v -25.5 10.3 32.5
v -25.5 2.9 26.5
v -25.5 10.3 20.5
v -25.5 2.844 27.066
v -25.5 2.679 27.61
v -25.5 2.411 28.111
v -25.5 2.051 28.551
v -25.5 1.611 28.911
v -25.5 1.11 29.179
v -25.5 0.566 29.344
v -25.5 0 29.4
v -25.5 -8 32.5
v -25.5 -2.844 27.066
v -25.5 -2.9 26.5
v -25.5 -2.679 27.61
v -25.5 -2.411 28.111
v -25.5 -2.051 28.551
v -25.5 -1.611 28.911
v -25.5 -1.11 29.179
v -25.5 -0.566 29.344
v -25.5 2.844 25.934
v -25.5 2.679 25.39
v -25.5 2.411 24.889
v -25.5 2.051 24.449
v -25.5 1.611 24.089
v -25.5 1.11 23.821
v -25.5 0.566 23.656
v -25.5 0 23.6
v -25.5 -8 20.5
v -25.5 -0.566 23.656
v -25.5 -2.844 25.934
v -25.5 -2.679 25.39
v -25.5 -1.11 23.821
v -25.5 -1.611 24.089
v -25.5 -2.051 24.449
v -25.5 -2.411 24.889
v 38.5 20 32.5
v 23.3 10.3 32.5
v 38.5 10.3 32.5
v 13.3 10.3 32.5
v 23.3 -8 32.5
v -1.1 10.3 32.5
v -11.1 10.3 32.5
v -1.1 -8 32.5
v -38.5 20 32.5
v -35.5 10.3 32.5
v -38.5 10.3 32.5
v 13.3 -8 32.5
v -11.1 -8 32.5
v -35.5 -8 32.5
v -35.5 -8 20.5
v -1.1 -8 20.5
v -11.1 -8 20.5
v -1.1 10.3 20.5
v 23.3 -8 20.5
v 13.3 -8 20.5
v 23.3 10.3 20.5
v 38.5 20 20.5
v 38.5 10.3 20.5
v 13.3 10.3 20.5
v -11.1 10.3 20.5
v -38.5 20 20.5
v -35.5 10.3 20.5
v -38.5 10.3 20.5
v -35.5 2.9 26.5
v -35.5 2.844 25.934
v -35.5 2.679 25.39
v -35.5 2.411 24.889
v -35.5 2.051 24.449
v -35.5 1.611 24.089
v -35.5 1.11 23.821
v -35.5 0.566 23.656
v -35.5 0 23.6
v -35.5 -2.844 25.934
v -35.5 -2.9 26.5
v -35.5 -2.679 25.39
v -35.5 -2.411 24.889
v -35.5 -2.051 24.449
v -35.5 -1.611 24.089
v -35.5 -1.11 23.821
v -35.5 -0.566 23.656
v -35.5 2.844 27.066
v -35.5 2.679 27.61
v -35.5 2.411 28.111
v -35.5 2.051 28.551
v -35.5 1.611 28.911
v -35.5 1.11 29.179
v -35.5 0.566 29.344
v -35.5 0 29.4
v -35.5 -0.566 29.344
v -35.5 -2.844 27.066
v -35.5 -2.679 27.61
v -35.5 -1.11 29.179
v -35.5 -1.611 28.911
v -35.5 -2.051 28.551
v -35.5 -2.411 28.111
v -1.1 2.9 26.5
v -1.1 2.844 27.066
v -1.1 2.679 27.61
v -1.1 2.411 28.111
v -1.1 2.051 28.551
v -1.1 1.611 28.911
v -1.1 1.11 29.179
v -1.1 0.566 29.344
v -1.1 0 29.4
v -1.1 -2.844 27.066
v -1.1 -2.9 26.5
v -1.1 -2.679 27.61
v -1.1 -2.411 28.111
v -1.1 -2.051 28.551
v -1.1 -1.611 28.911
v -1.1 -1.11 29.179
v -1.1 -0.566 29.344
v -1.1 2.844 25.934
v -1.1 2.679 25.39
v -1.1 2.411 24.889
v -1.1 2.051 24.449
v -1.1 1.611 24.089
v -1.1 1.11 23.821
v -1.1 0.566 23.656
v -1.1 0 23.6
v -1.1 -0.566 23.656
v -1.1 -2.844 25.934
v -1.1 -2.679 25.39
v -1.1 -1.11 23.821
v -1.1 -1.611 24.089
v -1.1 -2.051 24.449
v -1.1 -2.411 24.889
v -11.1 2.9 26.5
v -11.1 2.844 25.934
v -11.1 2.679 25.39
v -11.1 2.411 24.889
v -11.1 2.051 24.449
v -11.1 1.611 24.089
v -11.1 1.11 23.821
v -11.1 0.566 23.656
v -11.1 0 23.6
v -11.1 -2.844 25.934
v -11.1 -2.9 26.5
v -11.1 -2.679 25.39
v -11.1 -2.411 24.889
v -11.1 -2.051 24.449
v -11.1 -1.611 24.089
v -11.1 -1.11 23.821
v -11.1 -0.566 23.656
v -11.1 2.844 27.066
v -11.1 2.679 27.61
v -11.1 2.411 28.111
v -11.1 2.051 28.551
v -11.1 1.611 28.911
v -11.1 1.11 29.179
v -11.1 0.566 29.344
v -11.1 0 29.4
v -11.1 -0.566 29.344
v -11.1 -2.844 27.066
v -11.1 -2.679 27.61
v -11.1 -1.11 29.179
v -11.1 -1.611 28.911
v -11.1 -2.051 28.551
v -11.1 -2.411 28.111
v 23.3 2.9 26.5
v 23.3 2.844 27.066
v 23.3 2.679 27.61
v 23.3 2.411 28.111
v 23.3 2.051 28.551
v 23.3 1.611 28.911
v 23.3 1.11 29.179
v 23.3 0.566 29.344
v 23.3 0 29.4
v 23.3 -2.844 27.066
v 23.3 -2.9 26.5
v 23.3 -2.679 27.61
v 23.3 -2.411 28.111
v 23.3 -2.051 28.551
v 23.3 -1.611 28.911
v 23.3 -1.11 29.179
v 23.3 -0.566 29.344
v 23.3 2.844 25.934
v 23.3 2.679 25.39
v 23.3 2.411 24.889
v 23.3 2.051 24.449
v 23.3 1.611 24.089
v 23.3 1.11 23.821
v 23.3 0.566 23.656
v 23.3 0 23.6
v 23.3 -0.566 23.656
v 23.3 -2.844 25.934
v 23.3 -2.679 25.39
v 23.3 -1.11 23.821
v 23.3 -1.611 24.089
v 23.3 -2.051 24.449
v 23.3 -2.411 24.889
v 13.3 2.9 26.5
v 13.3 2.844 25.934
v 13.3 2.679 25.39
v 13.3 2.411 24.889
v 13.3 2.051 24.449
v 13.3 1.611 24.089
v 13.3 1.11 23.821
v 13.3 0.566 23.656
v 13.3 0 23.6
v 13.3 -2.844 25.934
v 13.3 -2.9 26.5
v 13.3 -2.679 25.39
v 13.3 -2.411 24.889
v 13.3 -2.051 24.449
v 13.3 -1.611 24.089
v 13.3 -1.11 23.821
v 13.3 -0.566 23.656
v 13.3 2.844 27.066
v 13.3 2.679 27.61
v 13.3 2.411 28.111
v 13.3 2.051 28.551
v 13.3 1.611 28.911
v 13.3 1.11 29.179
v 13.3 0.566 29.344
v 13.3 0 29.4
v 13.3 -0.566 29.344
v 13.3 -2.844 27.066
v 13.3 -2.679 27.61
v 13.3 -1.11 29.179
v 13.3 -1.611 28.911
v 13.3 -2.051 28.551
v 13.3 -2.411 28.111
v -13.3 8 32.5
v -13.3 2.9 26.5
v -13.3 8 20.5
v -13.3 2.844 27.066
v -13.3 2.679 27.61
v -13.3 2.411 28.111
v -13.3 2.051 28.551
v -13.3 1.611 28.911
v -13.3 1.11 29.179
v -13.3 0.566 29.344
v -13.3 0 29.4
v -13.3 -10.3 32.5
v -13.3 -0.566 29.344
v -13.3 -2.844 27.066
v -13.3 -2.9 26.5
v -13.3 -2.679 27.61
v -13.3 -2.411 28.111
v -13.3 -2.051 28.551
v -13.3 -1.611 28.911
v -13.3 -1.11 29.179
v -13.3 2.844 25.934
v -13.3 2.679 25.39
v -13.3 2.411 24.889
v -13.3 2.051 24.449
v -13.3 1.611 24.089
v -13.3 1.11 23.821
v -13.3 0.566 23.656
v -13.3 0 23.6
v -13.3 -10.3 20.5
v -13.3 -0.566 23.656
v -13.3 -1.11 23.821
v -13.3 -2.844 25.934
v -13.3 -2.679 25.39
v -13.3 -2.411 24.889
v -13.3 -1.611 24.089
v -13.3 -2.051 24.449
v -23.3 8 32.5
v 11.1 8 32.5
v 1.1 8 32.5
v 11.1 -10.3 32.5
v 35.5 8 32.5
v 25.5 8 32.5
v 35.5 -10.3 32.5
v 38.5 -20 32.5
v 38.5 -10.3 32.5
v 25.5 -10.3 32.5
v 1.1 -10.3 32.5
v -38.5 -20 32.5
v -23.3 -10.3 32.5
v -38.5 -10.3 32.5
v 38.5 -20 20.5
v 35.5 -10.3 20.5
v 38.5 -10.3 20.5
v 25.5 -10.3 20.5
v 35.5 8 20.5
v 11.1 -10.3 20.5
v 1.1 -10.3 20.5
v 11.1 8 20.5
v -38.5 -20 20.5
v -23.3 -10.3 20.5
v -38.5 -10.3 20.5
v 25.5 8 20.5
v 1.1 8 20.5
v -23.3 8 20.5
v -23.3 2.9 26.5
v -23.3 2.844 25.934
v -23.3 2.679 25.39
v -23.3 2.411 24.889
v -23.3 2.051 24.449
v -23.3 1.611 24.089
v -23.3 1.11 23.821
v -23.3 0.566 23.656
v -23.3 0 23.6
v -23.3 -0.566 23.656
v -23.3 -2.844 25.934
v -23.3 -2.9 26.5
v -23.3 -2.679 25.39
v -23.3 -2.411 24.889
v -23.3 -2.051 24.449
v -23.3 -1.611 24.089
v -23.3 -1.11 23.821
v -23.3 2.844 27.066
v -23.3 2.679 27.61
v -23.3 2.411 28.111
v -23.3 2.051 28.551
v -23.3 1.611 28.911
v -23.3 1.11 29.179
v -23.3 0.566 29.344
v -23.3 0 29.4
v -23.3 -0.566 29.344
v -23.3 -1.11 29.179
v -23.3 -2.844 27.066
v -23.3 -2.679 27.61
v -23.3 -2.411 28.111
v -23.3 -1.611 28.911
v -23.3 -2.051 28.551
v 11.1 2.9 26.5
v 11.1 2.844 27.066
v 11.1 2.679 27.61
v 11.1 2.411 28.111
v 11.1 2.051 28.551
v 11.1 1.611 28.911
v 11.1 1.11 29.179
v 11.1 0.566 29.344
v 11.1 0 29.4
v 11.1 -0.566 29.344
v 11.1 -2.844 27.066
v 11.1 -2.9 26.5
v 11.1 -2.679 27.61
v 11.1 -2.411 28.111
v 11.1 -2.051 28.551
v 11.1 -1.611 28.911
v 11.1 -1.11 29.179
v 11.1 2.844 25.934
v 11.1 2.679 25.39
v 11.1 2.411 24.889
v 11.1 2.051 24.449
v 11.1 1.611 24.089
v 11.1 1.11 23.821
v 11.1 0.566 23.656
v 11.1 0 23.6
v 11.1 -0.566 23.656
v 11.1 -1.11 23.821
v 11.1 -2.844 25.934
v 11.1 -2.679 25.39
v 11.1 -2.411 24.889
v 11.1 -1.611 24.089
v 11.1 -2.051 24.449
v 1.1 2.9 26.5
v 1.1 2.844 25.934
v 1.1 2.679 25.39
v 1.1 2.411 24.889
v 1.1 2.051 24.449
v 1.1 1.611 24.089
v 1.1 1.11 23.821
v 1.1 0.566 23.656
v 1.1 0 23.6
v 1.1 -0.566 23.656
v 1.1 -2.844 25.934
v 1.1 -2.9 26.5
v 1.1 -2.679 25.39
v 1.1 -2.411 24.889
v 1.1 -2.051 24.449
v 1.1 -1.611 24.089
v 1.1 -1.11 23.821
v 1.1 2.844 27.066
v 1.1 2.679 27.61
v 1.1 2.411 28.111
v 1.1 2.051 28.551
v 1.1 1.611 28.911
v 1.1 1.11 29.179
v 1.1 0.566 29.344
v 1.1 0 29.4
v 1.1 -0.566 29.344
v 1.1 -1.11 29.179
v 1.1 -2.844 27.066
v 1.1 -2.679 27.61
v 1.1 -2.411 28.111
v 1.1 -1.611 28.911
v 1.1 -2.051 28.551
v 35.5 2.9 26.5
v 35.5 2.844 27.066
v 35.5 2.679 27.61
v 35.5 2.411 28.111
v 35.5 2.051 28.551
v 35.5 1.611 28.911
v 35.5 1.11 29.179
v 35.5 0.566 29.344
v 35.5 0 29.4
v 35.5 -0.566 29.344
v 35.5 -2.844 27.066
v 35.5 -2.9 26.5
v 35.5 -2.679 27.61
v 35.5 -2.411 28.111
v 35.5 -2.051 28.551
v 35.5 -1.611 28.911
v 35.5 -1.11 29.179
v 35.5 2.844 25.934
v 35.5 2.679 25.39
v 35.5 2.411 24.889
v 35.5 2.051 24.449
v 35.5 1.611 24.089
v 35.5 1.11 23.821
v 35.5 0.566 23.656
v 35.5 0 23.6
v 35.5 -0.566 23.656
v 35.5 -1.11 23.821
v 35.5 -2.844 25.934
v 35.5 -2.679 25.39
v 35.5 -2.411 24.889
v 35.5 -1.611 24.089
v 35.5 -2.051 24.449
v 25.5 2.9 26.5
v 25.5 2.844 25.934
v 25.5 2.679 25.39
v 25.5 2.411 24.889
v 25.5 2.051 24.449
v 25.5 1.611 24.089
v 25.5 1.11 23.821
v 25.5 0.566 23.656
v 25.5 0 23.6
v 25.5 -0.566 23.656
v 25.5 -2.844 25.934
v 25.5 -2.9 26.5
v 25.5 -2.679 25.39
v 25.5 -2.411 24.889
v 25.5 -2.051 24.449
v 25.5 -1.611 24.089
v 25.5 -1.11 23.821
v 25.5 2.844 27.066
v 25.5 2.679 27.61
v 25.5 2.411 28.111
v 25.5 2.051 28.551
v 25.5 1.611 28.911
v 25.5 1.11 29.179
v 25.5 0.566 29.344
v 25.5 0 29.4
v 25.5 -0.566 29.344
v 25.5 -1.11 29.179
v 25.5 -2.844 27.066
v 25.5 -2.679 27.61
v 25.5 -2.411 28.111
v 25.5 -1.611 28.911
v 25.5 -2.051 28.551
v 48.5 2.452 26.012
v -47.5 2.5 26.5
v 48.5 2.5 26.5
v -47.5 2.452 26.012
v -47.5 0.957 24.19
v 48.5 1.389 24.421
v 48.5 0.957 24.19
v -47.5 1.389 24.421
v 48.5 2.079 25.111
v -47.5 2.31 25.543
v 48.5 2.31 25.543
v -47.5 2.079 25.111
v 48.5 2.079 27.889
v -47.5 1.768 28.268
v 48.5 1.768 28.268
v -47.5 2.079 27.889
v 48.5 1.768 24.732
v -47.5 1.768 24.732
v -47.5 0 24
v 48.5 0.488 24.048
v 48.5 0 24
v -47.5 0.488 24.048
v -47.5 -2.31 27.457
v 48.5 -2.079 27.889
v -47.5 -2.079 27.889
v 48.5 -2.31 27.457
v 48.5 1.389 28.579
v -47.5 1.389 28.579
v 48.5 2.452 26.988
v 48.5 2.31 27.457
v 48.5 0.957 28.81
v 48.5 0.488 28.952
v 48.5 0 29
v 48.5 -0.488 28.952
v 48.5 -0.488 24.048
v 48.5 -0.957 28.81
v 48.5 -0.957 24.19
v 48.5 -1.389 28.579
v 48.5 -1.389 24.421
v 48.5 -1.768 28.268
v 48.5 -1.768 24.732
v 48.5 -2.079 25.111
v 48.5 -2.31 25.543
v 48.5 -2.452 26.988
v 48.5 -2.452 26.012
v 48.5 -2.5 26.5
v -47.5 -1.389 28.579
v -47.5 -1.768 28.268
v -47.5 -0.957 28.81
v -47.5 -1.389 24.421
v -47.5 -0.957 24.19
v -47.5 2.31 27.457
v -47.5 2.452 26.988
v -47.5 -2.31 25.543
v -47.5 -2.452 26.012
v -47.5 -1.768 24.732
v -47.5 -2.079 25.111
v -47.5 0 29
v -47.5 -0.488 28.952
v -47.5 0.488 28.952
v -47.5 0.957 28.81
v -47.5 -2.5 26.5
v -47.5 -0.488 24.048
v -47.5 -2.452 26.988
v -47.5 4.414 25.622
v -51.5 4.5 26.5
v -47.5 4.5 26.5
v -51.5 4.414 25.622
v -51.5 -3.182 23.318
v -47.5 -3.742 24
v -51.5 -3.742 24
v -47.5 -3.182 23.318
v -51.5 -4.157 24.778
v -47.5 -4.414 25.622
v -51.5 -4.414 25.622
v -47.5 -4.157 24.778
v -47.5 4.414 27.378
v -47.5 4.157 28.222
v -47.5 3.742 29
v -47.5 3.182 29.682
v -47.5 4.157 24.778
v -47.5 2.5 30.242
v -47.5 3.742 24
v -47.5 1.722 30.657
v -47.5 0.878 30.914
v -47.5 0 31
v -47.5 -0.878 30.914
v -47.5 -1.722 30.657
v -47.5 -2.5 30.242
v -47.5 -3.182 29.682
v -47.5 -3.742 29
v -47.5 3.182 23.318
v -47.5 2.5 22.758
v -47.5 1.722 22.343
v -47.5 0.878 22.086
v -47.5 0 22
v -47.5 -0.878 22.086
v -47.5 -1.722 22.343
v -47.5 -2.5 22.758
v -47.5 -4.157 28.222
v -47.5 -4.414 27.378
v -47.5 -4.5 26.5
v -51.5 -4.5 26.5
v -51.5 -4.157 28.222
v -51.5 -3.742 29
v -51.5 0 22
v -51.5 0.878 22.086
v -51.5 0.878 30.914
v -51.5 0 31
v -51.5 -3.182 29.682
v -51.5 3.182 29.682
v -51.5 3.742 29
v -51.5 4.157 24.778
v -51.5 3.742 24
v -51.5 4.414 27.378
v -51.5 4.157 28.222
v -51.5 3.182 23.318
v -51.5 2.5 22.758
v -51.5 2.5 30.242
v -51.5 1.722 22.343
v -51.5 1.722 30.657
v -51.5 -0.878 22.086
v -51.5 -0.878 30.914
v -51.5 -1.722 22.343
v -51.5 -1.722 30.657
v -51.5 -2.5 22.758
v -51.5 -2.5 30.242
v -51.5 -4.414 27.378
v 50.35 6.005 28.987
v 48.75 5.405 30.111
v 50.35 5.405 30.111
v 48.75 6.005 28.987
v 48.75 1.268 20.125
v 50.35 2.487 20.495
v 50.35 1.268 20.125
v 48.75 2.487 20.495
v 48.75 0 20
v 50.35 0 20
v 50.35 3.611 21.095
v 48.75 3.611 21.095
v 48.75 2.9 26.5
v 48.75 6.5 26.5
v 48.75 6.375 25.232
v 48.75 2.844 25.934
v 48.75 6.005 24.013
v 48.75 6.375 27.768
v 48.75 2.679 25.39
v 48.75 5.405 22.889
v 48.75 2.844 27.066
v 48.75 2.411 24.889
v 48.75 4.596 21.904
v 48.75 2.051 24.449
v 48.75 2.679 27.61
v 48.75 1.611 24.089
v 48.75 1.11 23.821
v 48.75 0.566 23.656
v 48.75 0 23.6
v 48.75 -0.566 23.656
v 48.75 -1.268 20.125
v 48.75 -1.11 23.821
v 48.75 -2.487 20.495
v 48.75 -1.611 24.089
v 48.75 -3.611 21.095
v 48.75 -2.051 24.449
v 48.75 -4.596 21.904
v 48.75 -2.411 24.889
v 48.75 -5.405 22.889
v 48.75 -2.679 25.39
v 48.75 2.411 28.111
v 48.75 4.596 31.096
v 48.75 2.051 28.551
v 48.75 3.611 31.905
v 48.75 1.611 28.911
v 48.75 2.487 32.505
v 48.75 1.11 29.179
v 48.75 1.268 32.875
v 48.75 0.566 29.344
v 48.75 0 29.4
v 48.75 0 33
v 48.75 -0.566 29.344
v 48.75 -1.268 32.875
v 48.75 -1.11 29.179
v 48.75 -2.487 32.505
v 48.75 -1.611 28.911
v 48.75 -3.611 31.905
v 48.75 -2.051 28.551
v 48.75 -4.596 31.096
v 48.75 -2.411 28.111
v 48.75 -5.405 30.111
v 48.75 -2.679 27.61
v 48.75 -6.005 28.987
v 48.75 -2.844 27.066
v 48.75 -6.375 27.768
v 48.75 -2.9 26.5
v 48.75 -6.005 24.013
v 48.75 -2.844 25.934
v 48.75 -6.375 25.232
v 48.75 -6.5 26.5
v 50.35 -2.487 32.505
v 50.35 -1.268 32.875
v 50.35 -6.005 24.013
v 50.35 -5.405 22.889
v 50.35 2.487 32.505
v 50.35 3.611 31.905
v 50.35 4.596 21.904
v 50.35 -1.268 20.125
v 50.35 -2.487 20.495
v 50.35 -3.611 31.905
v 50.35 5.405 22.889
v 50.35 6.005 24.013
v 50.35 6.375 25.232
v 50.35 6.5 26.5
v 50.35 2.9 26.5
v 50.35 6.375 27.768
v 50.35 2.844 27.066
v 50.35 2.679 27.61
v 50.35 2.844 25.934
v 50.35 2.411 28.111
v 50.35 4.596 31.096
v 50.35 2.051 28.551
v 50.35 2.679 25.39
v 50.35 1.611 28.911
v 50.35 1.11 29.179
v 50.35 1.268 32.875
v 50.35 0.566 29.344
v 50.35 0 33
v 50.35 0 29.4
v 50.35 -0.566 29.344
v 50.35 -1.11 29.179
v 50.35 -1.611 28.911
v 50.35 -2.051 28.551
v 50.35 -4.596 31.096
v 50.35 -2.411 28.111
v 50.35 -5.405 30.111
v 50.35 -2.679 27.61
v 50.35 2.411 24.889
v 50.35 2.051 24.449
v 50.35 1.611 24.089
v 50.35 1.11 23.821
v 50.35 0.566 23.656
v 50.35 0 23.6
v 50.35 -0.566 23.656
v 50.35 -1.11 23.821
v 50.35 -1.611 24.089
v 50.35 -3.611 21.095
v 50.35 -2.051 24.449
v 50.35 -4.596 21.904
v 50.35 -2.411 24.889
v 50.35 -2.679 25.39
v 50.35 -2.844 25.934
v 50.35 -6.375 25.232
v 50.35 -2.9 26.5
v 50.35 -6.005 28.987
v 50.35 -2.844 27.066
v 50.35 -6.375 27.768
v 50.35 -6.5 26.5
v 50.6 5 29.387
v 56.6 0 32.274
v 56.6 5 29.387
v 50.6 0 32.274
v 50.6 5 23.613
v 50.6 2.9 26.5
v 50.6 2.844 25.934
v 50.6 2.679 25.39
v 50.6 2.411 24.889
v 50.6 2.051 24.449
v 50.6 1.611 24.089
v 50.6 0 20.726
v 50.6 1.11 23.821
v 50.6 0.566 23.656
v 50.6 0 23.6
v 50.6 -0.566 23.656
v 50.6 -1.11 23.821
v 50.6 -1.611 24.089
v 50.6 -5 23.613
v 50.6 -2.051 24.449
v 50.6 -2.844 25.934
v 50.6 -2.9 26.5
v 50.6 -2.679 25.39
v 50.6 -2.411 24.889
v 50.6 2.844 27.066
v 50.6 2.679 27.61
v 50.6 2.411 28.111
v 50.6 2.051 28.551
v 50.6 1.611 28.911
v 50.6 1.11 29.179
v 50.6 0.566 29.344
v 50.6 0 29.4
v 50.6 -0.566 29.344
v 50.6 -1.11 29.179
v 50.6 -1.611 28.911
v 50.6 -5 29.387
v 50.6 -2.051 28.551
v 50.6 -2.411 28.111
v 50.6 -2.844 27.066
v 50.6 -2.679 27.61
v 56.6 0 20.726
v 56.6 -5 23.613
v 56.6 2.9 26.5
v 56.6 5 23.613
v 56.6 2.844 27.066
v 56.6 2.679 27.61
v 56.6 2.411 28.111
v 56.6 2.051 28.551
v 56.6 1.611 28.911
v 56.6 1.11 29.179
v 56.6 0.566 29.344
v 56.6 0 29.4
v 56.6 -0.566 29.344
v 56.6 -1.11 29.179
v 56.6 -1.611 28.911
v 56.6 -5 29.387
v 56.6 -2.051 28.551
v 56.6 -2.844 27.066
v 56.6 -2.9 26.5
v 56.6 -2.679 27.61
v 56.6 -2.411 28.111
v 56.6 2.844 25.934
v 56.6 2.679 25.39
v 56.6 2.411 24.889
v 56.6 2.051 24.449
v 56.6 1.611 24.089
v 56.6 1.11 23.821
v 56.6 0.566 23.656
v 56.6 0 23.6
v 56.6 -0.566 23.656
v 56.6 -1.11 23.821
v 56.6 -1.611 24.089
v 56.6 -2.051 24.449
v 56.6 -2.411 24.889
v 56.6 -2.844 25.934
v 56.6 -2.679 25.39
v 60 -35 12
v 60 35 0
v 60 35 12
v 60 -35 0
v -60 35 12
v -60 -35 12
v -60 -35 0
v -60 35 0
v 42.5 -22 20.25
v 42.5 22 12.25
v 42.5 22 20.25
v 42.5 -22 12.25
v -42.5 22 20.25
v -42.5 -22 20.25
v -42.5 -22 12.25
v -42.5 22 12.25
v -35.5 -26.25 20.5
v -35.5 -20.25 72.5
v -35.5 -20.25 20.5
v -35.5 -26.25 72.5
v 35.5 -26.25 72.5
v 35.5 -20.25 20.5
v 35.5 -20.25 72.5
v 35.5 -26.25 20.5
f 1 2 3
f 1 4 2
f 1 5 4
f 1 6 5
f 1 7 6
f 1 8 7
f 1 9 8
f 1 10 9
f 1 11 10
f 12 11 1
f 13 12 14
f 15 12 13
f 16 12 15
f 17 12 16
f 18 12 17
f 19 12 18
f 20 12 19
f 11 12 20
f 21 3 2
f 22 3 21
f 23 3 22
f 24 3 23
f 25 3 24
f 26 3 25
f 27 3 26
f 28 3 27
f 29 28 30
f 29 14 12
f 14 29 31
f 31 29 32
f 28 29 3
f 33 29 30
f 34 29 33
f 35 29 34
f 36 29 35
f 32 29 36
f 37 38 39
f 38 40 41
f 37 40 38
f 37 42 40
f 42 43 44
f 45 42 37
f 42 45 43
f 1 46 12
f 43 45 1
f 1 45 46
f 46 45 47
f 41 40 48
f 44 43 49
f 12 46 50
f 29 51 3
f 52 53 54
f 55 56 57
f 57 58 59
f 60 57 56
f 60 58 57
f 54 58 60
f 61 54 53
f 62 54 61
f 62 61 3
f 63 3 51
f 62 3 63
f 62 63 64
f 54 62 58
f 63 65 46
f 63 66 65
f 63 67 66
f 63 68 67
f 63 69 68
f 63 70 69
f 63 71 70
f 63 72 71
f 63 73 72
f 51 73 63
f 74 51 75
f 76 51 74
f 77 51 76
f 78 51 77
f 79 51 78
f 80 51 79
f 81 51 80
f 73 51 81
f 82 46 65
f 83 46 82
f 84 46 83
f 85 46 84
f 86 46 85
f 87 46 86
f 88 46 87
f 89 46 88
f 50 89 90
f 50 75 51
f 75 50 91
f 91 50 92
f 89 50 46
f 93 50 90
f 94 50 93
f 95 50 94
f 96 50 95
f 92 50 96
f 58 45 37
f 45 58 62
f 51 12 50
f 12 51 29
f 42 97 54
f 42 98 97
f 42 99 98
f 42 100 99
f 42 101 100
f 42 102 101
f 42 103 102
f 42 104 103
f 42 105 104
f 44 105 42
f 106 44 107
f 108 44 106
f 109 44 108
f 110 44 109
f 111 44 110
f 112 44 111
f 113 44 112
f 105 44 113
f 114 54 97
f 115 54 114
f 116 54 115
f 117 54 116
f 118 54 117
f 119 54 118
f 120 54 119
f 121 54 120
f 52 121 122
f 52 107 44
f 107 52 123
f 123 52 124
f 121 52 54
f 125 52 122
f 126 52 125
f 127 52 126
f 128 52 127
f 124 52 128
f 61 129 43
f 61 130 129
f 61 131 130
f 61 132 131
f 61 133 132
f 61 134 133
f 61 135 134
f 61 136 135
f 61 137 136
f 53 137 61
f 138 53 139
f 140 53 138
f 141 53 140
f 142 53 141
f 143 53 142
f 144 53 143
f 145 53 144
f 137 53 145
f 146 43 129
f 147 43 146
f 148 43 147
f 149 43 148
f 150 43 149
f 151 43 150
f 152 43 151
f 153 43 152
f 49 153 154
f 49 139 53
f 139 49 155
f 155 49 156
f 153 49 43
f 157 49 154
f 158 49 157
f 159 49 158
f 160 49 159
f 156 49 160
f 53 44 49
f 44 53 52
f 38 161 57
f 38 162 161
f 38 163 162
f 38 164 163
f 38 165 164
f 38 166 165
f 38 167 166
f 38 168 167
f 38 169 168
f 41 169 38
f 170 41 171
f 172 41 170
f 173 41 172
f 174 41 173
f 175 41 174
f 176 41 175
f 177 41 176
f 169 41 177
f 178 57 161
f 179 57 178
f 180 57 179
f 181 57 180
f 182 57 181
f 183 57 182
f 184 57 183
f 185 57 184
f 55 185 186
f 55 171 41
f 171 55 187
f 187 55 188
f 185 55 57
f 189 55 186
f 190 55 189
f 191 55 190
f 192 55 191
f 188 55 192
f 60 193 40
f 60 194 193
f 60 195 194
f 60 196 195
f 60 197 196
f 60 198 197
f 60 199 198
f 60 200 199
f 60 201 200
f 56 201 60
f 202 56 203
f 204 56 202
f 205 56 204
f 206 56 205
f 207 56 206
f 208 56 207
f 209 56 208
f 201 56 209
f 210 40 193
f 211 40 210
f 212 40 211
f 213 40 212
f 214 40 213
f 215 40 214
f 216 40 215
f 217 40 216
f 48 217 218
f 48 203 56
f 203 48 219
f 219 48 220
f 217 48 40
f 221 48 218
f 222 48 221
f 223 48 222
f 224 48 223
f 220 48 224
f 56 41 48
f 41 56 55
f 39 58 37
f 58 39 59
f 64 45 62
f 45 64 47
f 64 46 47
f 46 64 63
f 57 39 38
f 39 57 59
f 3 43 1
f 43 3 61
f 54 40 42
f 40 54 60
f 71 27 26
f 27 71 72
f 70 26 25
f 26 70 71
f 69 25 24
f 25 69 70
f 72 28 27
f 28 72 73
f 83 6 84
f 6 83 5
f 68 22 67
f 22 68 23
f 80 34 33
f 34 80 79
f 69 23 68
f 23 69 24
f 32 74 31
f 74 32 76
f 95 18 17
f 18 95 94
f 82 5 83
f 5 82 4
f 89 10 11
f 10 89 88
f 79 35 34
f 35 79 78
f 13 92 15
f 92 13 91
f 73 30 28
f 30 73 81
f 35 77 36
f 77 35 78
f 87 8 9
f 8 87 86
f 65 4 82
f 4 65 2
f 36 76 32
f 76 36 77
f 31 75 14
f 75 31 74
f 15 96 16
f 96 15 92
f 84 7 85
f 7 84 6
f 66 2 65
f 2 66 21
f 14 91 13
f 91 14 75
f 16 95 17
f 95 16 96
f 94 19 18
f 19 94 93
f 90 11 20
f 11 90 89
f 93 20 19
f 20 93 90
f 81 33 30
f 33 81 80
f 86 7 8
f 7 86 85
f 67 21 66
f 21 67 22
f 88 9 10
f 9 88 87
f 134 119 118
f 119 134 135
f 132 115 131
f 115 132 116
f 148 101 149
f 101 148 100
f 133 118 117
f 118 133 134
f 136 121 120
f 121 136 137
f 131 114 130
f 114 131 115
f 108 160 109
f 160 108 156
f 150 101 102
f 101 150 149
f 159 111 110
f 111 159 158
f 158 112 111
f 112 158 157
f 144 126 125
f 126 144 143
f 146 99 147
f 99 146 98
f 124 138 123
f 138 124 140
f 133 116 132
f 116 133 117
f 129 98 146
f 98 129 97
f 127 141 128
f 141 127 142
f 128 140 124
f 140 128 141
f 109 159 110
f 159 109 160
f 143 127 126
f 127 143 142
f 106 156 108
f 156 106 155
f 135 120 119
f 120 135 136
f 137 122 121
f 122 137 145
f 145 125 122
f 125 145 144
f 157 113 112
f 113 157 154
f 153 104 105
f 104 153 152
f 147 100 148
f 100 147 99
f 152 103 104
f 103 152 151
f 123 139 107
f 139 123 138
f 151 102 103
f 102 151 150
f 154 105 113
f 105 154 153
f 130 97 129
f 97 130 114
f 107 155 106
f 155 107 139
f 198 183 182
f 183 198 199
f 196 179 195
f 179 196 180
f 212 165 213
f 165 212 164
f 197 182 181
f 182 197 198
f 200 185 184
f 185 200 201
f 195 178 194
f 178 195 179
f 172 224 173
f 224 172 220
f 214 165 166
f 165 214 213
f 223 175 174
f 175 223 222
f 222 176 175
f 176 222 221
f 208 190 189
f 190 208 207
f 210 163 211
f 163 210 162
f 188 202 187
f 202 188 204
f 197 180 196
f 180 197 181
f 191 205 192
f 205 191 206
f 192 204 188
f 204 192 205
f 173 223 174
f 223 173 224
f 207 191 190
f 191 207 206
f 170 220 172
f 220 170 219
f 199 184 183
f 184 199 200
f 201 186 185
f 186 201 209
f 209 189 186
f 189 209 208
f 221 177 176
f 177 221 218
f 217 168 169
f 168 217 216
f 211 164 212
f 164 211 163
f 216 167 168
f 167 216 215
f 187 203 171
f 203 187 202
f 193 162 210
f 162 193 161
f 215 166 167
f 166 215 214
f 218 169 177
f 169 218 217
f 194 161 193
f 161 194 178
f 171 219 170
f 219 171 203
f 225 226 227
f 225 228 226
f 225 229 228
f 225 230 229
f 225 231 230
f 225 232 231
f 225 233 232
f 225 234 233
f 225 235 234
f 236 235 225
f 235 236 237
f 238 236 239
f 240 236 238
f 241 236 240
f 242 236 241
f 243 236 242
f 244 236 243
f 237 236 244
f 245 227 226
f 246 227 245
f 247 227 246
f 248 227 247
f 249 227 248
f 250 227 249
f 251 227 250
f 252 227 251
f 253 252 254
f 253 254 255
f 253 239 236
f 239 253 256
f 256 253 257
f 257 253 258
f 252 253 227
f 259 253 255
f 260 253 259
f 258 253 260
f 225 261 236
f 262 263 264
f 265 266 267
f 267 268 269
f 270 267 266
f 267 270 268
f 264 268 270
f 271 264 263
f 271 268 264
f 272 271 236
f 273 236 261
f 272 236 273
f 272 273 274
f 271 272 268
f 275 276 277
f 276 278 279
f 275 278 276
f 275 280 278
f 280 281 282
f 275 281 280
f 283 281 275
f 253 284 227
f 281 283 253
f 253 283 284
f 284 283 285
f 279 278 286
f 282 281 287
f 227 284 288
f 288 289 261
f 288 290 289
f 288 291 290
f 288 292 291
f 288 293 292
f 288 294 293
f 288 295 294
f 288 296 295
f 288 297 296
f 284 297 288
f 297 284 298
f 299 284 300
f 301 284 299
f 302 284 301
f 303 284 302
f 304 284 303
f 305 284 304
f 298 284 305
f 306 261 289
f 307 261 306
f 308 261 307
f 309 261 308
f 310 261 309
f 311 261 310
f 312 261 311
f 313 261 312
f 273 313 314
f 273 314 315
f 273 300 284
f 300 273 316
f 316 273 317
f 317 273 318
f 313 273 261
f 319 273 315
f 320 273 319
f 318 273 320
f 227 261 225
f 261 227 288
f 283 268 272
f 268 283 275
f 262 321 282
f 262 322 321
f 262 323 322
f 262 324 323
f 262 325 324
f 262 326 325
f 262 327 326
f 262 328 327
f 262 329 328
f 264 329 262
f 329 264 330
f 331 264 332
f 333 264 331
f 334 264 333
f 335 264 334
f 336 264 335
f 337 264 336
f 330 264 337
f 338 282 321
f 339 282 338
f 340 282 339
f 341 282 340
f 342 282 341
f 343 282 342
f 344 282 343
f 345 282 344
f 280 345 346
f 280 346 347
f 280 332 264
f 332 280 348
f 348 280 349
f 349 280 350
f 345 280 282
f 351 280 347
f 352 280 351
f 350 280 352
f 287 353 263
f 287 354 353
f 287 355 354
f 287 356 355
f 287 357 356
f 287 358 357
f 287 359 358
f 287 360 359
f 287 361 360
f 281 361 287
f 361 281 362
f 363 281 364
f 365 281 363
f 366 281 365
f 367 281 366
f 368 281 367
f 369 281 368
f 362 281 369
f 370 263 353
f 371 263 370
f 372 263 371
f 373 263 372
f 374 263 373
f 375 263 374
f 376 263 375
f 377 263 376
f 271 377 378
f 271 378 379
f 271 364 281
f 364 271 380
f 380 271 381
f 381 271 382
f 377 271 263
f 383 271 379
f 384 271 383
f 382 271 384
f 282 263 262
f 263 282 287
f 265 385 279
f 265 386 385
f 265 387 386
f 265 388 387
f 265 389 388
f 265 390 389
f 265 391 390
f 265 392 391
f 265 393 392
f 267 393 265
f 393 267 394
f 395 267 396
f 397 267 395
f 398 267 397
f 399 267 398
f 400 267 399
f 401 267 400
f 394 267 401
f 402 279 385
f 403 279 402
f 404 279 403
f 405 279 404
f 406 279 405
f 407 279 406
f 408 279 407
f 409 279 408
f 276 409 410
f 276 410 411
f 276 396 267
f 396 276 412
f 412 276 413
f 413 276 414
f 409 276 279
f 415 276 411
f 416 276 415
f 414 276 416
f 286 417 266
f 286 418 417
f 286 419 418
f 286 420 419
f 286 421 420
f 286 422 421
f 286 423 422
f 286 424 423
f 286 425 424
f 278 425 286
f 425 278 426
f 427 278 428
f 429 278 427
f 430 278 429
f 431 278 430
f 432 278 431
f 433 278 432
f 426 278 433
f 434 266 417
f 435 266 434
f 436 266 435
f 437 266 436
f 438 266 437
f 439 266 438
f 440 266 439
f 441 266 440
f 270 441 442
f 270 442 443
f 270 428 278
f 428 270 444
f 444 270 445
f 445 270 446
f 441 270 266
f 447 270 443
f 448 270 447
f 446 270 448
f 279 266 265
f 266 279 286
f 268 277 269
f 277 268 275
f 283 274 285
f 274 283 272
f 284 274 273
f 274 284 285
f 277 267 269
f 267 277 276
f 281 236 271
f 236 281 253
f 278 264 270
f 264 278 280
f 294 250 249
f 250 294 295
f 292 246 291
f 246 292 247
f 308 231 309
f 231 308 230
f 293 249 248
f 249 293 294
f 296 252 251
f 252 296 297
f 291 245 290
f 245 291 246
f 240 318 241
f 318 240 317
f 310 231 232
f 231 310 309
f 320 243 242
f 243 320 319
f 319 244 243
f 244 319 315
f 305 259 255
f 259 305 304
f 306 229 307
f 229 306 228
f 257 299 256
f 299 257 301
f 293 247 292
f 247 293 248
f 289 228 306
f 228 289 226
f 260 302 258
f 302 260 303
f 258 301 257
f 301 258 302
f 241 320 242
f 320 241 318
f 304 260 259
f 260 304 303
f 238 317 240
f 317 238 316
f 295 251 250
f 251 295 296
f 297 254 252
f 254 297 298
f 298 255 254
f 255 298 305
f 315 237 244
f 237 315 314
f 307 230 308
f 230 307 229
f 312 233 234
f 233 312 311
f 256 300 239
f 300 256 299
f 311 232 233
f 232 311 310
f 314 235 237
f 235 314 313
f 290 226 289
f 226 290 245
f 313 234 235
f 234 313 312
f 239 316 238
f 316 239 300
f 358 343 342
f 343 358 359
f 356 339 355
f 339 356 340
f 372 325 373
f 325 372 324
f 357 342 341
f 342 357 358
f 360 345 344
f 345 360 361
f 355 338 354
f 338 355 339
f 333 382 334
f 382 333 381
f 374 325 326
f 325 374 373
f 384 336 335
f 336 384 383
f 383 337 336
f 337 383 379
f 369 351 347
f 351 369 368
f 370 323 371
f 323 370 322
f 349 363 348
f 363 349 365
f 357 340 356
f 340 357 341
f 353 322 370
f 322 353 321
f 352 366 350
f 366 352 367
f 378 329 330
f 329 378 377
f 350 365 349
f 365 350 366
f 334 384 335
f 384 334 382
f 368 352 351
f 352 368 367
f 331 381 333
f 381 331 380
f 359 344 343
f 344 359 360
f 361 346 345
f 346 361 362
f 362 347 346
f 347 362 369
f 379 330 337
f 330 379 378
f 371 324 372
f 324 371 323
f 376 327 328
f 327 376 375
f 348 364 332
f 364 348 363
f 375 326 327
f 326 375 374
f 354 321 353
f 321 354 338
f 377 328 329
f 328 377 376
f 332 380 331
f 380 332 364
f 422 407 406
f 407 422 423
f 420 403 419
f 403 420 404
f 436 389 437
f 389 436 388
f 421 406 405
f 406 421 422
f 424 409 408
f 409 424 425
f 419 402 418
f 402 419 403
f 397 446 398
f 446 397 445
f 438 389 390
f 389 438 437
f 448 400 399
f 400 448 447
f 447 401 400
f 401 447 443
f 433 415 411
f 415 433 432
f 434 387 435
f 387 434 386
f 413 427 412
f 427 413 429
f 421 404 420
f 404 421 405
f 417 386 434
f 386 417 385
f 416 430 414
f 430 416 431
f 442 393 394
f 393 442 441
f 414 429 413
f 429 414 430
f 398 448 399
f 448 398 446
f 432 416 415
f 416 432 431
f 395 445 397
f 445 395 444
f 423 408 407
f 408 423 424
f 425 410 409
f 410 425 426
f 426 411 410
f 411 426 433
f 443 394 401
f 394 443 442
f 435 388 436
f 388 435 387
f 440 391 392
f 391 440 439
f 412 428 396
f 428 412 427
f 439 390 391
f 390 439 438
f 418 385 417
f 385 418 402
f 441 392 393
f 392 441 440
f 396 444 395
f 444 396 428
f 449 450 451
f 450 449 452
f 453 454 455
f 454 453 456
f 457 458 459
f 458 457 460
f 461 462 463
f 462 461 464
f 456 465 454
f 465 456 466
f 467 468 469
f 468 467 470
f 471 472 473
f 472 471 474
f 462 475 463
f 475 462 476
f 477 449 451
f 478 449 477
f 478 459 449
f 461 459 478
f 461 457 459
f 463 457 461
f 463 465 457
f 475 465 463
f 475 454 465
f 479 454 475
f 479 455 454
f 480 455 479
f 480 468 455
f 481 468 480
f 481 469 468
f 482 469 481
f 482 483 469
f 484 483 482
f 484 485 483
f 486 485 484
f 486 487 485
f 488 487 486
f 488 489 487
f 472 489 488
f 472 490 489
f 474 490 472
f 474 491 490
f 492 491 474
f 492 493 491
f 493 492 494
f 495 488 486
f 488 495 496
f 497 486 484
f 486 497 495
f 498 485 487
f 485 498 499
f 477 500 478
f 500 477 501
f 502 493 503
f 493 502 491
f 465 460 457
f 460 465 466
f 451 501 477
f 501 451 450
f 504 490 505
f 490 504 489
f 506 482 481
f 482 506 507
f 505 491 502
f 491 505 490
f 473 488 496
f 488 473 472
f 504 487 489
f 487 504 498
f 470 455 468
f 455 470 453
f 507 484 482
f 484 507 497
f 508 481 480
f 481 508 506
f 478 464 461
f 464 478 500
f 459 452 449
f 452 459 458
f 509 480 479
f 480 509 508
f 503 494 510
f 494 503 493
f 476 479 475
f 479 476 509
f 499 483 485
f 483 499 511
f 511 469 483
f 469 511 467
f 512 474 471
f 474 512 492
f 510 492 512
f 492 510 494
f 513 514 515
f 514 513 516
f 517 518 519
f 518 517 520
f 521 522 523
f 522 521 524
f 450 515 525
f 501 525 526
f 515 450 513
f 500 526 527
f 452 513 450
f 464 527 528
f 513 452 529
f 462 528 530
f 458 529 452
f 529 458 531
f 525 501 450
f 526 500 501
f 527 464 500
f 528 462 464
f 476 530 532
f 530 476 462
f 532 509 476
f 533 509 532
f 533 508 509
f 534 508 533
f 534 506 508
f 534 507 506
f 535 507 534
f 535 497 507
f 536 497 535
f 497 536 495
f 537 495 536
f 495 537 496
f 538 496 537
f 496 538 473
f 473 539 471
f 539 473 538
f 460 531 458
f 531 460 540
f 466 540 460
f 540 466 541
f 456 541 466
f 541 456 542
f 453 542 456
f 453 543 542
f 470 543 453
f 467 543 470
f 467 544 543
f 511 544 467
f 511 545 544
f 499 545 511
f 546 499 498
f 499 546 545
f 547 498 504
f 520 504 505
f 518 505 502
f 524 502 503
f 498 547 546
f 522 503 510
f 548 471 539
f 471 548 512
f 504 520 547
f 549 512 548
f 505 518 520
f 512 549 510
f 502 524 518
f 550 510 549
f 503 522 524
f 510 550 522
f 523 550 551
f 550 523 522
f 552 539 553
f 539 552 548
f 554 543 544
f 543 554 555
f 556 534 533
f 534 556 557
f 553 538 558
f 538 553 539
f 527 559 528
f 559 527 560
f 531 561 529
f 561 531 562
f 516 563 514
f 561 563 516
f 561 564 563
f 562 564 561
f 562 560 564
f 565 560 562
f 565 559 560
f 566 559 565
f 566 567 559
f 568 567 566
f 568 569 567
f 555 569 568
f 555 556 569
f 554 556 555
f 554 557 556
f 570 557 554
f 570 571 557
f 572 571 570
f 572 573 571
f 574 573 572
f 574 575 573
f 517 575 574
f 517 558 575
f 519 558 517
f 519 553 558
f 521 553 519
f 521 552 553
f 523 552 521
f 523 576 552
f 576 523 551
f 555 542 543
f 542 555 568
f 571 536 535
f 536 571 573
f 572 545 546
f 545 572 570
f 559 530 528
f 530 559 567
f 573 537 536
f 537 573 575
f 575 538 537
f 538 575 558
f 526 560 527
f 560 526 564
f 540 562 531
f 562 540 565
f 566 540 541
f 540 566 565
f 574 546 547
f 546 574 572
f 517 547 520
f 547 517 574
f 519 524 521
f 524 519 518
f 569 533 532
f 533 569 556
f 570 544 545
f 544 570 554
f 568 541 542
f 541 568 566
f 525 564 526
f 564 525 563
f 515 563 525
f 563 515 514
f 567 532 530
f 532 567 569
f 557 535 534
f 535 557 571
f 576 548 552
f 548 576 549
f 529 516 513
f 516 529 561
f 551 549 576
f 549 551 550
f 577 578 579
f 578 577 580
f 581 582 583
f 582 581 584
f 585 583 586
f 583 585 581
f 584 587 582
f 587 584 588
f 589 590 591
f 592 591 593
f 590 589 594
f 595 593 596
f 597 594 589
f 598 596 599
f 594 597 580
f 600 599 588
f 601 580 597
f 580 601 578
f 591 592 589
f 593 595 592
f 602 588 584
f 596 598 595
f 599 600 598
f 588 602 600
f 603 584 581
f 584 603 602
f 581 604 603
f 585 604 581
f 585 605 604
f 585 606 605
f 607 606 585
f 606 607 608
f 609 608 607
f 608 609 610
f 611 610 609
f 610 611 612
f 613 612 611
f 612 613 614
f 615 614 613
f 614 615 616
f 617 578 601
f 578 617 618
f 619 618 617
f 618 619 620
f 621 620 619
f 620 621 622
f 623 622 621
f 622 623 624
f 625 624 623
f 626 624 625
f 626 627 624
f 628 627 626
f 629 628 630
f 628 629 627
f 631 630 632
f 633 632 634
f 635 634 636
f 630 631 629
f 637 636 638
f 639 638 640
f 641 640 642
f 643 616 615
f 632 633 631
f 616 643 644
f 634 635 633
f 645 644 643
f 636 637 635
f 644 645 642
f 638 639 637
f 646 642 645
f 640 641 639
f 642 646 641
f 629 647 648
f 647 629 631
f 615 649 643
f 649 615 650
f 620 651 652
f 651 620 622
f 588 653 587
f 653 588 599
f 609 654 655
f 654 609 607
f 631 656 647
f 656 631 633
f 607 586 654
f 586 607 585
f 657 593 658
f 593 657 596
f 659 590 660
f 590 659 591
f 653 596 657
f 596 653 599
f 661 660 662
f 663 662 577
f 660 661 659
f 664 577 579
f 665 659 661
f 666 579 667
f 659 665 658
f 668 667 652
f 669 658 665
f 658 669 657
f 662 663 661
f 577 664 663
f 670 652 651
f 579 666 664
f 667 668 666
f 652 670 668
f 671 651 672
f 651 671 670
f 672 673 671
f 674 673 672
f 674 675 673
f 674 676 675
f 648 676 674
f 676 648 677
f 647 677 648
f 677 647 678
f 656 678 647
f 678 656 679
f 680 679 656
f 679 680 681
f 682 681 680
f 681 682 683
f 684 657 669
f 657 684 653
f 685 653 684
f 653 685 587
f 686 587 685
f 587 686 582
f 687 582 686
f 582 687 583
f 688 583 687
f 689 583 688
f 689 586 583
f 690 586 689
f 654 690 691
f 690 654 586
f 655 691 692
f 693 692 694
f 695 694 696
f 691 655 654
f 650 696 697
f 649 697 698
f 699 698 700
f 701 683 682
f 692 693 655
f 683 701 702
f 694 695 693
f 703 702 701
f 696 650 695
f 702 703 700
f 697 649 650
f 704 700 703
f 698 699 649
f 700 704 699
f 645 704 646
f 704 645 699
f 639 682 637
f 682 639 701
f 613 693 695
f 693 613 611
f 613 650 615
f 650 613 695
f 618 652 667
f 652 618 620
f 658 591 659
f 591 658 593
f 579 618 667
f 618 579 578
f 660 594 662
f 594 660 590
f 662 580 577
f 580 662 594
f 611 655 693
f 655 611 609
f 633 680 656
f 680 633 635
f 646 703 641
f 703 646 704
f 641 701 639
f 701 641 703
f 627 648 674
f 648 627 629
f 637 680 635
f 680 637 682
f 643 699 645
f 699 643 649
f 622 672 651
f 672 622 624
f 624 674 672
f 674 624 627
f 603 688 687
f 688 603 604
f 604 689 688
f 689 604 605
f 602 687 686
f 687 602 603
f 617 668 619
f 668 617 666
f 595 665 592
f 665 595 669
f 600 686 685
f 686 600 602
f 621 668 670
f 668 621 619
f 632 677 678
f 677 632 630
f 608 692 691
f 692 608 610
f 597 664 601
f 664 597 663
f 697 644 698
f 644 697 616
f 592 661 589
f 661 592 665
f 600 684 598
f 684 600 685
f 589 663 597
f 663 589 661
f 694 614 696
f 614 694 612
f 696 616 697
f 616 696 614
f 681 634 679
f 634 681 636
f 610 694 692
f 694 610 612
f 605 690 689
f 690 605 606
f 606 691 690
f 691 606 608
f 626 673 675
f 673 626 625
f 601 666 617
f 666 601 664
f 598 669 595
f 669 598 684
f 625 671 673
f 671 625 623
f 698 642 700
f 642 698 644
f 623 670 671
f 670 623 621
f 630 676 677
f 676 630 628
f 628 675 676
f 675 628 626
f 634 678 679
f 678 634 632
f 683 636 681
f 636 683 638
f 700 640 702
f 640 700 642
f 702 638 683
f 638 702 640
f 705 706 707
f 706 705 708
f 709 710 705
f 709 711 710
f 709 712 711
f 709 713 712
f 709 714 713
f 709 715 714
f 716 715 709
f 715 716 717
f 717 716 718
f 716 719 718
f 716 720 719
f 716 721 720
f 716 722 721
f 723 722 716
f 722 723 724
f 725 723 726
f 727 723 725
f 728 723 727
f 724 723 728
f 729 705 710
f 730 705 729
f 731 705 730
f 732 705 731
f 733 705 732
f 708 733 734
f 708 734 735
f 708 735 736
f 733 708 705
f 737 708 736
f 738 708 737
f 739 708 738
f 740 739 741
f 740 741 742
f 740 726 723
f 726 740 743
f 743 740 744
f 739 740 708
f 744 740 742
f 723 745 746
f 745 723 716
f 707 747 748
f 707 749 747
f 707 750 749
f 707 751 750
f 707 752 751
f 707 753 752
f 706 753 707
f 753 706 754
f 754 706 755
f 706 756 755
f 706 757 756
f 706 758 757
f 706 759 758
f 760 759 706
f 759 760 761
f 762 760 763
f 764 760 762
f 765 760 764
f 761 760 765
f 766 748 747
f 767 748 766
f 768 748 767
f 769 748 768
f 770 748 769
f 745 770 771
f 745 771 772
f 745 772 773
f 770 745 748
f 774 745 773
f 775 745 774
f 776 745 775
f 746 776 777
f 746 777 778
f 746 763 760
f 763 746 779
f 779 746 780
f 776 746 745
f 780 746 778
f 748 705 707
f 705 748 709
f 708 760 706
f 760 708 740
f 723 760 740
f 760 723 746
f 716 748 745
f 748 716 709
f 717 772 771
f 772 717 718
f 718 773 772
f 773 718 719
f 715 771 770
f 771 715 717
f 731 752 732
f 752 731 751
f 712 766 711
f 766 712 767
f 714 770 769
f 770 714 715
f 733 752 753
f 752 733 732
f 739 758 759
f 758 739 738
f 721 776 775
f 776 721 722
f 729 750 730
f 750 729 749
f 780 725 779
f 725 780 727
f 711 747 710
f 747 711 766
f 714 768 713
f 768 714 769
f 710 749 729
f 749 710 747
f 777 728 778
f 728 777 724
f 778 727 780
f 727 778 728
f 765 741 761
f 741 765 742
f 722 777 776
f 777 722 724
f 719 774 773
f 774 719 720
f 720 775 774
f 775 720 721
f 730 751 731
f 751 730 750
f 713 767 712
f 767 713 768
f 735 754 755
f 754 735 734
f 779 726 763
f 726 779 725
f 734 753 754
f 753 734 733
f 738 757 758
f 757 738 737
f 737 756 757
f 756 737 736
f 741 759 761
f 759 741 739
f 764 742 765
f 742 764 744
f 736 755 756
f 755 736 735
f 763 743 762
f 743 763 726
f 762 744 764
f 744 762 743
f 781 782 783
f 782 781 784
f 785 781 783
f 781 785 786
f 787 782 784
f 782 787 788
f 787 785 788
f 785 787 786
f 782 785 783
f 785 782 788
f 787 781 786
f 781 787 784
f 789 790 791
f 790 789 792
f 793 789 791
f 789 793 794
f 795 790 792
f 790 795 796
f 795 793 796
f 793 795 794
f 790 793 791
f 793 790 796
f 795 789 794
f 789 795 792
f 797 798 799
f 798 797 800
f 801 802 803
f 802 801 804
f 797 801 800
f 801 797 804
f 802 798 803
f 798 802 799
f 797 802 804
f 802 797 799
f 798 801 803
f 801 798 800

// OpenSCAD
$fn = 32;

// ------------------------------------------------------------------------
// Comb hinge with flap: leaf 77 x 20 mm, pin d5, flap 52 mm
// Every part is its own module, assembly() places every instance.
// ------------------------------------------------------------------------

// --- part 1 ---
module hinge_bed() {
  difference() {
    translate([-60, -35, 0]) cube([120, 70, 12]);
  }
}

// --- part 2 ---
module hinge_riser() {
  difference() {
    translate([-42.5, -22, 0]) cube([85, 44, 8]);
  }
}

// --- part 3 ---
module hinge_leaf_a() {
  difference() {
    union() {
      translate([-35.5, -8, -6]) cube([10, 28, 12]);
      translate([-11.1, -8, -6]) cube([10, 28, 12]);
      translate([13.3, -8, -6]) cube([10, 28, 12]);
      translate([-38.5, 10.3, -6]) cube([77, 9.7, 12]);
    }
    translate([-30.5, 0, 0]) rotate([0, 90, 0]) cylinder(h = 12, d = 5.8, center = true);
    translate([-6.1, 0, 0]) rotate([0, 90, 0]) cylinder(h = 12, d = 5.8, center = true);
    translate([18.3, 0, 0]) rotate([0, 90, 0]) cylinder(h = 12, d = 5.8, center = true);
  }
}

// --- part 4 ---
module hinge_leaf_b() {
  difference() {
    union() {
      translate([-23.3, -20, -6]) cube([10, 28, 12]);
      translate([1.1, -20, -6]) cube([10, 28, 12]);
      translate([25.5, -20, -6]) cube([10, 28, 12]);
      translate([-38.5, -20, -6]) cube([77, 9.7, 12]);
    }
    translate([-18.3, 0, 0]) rotate([0, 90, 0]) cylinder(h = 12, d = 5.8, center = true);
    translate([6.1, 0, 0]) rotate([0, 90, 0]) cylinder(h = 12, d = 5.8, center = true);
    translate([30.5, 0, 0]) rotate([0, 90, 0]) cylinder(h = 12, d = 5.8, center = true);
  }
}

// --- part 5 ---
module hinge_flap() {
  difference() {
    translate([-35.5, -26, 0]) cube([71, 52, 6]);
  }
}

// --- part 6 ---
module hinge_pin() {
  rotate([0, 90, 0]) cylinder(h = 97, d = 5, center = true);
  translate([-51.5, 0, 0]) rotate([0, 90, 0]) cylinder(h = 4, d = 9);
}

// --- part 7 ---
module pin_washer() {
  difference() {
      translate([0, 0, 0]) cylinder(h = 1.6, d = 13);
      translate([0, 0, -1]) cylinder(h = 3.6, d = 5.8);
    }
}

// --- part 8 ---
module pin_nut() {
  difference() {
    linear_extrude(height = 6) polygon(points = [[5.774, 0], [2.887, 5], [-2.887, 5], [-5.774, 0], [-2.887, -5], [2.887, -5]]);
    translate([0, 0, -1]) cylinder(h = 8, d = 5.8);
  }
}

// --- assembly ---
module assembly() {
  color([0.80, 0.24, 0.20]) translate([0, 0, 0]) rotate([0, 0, 0]) hinge_bed();
  color([0.20, 0.45, 0.75]) translate([0, 0, 12.25]) rotate([0, 0, 0]) hinge_riser();
  color([0.25, 0.62, 0.32]) translate([0, 0, 26.5]) rotate([0, 0, 0]) hinge_leaf_a();
  color([0.92, 0.70, 0.18]) translate([0, 0, 26.5]) rotate([0, 0, 0]) hinge_leaf_b();
  color([0.58, 0.35, 0.70]) translate([0, -20.25, 46.5]) rotate([90, 0, 0]) hinge_flap();
  color([0.16, 0.66, 0.66]) translate([0, 0, 26.5]) rotate([0, 0, 0]) hinge_pin();
  color([0.85, 0.48, 0.18]) translate([48.75, 0, 26.5]) rotate([0, 90, 0]) pin_washer();
  color([0.55, 0.60, 0.65]) translate([50.6, 0, 26.5]) rotate([0, 90, 0]) pin_nut();
}

assembly();
